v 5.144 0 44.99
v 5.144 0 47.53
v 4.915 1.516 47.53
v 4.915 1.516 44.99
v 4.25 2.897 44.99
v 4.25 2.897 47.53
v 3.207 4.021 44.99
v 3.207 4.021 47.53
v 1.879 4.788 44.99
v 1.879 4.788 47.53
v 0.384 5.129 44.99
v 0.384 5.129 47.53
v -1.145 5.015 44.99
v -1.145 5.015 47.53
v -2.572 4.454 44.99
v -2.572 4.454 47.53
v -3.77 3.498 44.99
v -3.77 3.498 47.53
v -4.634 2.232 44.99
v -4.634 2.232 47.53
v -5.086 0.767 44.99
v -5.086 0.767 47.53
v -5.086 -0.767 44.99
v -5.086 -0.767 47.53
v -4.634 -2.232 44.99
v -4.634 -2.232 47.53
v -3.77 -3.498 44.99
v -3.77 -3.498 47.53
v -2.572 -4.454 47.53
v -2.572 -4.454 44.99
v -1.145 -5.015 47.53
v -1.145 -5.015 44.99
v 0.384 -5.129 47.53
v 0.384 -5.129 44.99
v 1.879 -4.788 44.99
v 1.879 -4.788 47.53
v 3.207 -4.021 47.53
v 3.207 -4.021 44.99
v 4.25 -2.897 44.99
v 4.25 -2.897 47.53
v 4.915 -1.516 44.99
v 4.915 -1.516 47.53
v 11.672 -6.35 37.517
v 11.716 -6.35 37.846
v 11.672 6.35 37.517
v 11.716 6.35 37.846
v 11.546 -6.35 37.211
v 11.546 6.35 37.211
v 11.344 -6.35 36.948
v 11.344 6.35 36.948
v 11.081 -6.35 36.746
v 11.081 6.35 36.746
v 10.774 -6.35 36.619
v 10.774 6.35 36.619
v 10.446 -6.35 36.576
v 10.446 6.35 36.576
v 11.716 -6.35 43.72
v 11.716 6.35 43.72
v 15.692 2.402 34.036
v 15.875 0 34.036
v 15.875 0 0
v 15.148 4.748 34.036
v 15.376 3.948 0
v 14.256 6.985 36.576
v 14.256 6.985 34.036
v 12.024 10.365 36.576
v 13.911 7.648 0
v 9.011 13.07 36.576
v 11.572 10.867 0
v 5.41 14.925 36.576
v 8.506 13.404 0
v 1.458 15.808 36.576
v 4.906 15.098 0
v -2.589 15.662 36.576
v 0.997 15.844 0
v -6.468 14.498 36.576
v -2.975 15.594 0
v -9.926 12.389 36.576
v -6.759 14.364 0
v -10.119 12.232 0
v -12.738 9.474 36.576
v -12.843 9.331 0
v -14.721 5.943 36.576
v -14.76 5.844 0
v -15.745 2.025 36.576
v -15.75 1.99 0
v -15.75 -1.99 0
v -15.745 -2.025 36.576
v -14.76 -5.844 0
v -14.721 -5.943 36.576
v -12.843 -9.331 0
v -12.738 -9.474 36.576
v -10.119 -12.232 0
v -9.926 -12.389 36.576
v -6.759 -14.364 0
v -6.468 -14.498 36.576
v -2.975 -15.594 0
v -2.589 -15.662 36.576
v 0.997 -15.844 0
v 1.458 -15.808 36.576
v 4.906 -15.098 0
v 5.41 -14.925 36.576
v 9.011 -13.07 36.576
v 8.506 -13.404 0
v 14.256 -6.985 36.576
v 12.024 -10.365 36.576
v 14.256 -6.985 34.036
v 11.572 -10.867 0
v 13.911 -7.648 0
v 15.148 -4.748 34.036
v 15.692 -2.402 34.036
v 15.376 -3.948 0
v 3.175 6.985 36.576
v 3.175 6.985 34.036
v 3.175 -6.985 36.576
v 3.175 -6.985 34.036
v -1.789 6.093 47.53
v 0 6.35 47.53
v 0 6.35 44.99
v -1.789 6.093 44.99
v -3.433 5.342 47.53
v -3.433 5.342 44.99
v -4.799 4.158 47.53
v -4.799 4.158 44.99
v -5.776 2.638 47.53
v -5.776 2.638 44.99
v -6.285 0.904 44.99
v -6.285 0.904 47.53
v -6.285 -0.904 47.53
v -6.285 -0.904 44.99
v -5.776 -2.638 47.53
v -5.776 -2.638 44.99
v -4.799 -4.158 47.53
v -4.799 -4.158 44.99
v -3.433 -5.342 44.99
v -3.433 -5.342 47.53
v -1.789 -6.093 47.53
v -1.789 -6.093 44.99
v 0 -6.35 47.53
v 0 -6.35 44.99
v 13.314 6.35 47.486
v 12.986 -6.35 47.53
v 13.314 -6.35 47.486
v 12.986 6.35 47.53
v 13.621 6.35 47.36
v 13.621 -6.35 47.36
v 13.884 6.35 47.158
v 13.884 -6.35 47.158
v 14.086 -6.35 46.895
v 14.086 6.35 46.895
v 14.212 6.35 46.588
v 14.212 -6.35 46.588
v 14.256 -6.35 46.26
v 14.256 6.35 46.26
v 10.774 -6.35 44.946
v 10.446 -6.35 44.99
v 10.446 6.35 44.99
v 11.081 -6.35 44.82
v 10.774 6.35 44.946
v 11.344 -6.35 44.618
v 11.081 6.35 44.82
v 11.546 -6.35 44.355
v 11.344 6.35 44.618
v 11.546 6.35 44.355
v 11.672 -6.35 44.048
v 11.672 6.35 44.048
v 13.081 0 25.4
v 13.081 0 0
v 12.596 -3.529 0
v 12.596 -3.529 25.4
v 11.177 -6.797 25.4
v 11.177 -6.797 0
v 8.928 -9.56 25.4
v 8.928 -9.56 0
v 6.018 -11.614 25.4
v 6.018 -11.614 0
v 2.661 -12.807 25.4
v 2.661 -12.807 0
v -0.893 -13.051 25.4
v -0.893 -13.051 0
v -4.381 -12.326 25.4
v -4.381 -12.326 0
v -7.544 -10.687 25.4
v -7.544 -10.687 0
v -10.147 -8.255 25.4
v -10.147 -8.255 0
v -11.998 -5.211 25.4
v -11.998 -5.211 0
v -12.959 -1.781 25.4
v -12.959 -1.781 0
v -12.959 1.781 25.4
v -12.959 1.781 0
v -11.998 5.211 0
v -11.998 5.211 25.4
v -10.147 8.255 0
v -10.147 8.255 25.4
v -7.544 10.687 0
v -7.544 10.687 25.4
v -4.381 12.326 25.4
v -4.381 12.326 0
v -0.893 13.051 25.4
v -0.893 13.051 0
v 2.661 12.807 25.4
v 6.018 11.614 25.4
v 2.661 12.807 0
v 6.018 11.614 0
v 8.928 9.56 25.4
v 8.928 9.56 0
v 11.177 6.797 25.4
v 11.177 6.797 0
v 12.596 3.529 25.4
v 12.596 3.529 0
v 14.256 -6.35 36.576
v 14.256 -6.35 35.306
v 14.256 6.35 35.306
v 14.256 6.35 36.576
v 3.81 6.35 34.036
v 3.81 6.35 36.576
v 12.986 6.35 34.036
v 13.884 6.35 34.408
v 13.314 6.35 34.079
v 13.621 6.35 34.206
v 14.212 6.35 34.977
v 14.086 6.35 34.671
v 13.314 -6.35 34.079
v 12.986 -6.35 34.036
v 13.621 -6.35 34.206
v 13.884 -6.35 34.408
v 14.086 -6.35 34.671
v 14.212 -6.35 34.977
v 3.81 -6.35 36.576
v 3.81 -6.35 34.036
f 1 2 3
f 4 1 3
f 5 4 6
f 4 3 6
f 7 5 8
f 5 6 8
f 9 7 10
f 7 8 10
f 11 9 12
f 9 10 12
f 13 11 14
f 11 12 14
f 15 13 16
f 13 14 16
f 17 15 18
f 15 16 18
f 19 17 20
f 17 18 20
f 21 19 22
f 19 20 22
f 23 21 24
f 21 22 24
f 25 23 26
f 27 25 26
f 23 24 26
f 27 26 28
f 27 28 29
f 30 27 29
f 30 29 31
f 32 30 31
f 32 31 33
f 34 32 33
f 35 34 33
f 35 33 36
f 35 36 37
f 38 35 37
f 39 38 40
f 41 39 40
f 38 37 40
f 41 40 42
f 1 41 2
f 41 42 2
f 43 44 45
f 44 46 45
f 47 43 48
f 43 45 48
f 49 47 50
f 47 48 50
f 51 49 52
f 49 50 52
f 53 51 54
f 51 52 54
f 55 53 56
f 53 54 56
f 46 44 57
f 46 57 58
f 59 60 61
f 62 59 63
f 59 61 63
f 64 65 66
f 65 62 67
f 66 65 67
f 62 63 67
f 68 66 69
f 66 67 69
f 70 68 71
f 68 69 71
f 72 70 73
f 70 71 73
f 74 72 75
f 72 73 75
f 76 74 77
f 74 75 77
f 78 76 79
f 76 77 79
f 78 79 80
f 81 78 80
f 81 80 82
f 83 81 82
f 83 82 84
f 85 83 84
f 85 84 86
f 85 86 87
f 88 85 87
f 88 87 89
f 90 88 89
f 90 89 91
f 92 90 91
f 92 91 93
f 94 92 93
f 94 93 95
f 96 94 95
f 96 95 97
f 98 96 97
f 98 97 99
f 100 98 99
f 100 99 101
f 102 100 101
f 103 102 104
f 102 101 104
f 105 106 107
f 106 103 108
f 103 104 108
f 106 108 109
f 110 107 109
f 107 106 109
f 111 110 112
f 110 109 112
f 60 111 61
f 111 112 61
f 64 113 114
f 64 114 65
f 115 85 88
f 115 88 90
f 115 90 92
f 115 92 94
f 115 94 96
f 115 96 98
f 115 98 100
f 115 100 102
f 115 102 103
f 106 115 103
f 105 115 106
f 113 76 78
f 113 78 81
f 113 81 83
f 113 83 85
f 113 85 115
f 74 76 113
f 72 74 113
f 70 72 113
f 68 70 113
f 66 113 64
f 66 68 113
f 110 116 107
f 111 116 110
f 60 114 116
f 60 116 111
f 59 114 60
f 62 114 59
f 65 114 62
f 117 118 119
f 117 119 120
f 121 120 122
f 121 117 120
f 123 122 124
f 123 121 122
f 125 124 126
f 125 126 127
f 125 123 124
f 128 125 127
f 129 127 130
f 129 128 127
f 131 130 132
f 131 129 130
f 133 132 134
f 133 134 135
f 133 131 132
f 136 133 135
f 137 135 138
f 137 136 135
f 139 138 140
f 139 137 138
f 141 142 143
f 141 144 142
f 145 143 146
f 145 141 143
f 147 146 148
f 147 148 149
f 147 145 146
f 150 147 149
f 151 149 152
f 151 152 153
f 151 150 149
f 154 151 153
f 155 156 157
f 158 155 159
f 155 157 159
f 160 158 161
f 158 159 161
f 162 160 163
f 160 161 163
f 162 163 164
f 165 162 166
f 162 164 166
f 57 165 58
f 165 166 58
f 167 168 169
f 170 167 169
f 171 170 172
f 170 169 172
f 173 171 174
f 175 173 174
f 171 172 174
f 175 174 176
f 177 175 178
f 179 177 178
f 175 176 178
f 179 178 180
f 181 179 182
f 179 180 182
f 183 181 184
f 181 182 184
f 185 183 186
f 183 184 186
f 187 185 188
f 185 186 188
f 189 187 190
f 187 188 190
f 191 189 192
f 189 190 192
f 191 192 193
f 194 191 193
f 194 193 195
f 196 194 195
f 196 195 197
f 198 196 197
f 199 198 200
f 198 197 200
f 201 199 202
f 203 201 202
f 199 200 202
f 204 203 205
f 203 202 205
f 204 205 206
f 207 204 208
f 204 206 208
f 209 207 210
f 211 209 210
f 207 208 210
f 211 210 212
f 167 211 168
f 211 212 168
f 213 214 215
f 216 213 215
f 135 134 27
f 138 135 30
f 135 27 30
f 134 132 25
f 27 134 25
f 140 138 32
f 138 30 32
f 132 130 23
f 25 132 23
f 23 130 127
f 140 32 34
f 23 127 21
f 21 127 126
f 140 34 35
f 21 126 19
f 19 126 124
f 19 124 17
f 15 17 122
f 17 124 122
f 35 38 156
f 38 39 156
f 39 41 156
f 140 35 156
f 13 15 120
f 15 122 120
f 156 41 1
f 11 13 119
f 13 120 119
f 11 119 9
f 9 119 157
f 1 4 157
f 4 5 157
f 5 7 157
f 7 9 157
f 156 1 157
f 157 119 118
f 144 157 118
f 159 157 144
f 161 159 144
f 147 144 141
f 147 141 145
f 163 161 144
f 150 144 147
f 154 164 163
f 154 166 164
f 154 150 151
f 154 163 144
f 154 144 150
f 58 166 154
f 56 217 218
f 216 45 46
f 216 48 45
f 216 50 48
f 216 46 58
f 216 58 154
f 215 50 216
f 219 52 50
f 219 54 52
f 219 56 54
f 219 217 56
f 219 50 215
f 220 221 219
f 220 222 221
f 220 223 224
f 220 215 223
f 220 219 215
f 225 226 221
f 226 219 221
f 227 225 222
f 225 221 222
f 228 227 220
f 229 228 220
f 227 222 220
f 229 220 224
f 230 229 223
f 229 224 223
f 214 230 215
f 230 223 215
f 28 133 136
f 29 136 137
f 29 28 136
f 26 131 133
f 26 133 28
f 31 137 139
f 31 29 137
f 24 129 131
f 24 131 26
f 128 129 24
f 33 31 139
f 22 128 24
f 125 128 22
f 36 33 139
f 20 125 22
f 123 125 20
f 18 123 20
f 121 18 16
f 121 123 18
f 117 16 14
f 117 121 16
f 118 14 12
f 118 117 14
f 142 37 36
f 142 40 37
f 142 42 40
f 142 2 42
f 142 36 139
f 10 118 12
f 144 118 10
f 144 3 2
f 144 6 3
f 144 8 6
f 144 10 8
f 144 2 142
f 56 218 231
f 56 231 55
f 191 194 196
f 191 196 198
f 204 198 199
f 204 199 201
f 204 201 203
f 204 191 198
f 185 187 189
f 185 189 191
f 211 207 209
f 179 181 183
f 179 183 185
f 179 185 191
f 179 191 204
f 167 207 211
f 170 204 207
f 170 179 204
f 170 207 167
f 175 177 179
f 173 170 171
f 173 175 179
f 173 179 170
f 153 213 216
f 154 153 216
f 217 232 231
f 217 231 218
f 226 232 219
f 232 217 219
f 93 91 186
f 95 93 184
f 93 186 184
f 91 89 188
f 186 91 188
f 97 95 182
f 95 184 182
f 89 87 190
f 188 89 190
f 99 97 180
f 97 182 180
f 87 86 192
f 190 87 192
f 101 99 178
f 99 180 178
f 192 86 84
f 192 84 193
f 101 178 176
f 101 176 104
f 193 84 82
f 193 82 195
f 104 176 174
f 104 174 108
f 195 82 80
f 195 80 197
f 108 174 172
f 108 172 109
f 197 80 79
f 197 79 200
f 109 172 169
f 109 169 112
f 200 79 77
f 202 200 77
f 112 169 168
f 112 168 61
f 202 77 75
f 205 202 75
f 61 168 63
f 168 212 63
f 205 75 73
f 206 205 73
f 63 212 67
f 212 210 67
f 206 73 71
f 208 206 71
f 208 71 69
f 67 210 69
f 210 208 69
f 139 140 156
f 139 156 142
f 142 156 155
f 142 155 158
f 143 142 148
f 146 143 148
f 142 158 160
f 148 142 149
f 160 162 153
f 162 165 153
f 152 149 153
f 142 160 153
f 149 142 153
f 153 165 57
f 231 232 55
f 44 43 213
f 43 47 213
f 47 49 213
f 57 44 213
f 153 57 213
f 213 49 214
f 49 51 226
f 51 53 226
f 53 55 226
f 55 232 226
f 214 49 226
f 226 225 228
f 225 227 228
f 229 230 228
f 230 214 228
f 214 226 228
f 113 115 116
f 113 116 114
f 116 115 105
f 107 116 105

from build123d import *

# Parameters (mm, degrees)
F0_R      = 15.875
F1_DEPTH  = 36.576
F2_R      = 13.081
F3_DEPTH  = 25.4
F4_W      = 25.4
F4_H      = 13.97
F5_DEPTH  = 2.54
F6_W      = 10.445715
F6_H      = 12.7
F7_DEPTH  = 2.54
F8_W      = 2.54
F8_H      = 12.7
F9_DEPTH  = 10.95375
F10_R     = 5.1435
F11_DEPTH = 2.54
F12_R     = 1.27


with BuildPart() as f1:
    # F0 (on Top) → F1 (new body)
    with BuildSketch(Plane.XY):
        Circle(F0_R)
    extrude(amount=F1_DEPTH)

    # F2 (on face) → F3 (cut)
    with BuildSketch(Plane(origin=(0, 0, 0), x_dir=(1, 0, 0), z_dir=(0, 0, -1))):
        Circle(F2_R)
    extrude(amount=-F3_DEPTH, mode=Mode.SUBTRACT)

    # F4 (on face) → F5 (cut)
    with BuildSketch(Plane.XY.offset(36.576)):
        with Locations((15.875, 0)):
            Rectangle(F4_W, F4_H)
    extrude(amount=-F5_DEPTH, mode=Mode.SUBTRACT)


with BuildPart() as f7:
    # F6 (on face) → F7 (new body)
    with BuildSketch(Plane.XY.offset(34.036)):
        with Locations((9.032857, 0)):
            Rectangle(F6_W, F6_H)
    extrude(amount=F7_DEPTH)

    # F8 (on face) → F9 (join)
    with BuildSketch(Plane.XY.offset(36.576)):
        with Locations((12.985715, 0)):
            Rectangle(F8_W, F8_H)
    extrude(amount=F9_DEPTH)

    # F10 (on face) → F11 (join)
    with BuildSketch(Plane.XY.offset(47.52975)):
        with BuildLine():
            Line((14.255715, -6.35), (14.255715, 6.35))
            Line((14.255715, 6.35), (0, 6.35))
            ThreePointArc((0, 6.35), (-6.35, 0), (0, -6.35))
            Line((0, -6.35), (14.255715, -6.35))
        make_face()
        Circle(F10_R, mode=Mode.SUBTRACT)
    extrude(amount=-F11_DEPTH)

    # F12
    f12_edges = [f7.edges().sort_by_distance(p)[0] for p in [
        (14.255715, 0, 47.52975),
        (11.715715, 0, 44.98975),
        (14.255715, 0, 34.036),
        (11.715715, 0, 36.576),
    ]]
    fillet(f12_edges, radius=F12_R)


solid = Compound([f1.part, f7.part])
